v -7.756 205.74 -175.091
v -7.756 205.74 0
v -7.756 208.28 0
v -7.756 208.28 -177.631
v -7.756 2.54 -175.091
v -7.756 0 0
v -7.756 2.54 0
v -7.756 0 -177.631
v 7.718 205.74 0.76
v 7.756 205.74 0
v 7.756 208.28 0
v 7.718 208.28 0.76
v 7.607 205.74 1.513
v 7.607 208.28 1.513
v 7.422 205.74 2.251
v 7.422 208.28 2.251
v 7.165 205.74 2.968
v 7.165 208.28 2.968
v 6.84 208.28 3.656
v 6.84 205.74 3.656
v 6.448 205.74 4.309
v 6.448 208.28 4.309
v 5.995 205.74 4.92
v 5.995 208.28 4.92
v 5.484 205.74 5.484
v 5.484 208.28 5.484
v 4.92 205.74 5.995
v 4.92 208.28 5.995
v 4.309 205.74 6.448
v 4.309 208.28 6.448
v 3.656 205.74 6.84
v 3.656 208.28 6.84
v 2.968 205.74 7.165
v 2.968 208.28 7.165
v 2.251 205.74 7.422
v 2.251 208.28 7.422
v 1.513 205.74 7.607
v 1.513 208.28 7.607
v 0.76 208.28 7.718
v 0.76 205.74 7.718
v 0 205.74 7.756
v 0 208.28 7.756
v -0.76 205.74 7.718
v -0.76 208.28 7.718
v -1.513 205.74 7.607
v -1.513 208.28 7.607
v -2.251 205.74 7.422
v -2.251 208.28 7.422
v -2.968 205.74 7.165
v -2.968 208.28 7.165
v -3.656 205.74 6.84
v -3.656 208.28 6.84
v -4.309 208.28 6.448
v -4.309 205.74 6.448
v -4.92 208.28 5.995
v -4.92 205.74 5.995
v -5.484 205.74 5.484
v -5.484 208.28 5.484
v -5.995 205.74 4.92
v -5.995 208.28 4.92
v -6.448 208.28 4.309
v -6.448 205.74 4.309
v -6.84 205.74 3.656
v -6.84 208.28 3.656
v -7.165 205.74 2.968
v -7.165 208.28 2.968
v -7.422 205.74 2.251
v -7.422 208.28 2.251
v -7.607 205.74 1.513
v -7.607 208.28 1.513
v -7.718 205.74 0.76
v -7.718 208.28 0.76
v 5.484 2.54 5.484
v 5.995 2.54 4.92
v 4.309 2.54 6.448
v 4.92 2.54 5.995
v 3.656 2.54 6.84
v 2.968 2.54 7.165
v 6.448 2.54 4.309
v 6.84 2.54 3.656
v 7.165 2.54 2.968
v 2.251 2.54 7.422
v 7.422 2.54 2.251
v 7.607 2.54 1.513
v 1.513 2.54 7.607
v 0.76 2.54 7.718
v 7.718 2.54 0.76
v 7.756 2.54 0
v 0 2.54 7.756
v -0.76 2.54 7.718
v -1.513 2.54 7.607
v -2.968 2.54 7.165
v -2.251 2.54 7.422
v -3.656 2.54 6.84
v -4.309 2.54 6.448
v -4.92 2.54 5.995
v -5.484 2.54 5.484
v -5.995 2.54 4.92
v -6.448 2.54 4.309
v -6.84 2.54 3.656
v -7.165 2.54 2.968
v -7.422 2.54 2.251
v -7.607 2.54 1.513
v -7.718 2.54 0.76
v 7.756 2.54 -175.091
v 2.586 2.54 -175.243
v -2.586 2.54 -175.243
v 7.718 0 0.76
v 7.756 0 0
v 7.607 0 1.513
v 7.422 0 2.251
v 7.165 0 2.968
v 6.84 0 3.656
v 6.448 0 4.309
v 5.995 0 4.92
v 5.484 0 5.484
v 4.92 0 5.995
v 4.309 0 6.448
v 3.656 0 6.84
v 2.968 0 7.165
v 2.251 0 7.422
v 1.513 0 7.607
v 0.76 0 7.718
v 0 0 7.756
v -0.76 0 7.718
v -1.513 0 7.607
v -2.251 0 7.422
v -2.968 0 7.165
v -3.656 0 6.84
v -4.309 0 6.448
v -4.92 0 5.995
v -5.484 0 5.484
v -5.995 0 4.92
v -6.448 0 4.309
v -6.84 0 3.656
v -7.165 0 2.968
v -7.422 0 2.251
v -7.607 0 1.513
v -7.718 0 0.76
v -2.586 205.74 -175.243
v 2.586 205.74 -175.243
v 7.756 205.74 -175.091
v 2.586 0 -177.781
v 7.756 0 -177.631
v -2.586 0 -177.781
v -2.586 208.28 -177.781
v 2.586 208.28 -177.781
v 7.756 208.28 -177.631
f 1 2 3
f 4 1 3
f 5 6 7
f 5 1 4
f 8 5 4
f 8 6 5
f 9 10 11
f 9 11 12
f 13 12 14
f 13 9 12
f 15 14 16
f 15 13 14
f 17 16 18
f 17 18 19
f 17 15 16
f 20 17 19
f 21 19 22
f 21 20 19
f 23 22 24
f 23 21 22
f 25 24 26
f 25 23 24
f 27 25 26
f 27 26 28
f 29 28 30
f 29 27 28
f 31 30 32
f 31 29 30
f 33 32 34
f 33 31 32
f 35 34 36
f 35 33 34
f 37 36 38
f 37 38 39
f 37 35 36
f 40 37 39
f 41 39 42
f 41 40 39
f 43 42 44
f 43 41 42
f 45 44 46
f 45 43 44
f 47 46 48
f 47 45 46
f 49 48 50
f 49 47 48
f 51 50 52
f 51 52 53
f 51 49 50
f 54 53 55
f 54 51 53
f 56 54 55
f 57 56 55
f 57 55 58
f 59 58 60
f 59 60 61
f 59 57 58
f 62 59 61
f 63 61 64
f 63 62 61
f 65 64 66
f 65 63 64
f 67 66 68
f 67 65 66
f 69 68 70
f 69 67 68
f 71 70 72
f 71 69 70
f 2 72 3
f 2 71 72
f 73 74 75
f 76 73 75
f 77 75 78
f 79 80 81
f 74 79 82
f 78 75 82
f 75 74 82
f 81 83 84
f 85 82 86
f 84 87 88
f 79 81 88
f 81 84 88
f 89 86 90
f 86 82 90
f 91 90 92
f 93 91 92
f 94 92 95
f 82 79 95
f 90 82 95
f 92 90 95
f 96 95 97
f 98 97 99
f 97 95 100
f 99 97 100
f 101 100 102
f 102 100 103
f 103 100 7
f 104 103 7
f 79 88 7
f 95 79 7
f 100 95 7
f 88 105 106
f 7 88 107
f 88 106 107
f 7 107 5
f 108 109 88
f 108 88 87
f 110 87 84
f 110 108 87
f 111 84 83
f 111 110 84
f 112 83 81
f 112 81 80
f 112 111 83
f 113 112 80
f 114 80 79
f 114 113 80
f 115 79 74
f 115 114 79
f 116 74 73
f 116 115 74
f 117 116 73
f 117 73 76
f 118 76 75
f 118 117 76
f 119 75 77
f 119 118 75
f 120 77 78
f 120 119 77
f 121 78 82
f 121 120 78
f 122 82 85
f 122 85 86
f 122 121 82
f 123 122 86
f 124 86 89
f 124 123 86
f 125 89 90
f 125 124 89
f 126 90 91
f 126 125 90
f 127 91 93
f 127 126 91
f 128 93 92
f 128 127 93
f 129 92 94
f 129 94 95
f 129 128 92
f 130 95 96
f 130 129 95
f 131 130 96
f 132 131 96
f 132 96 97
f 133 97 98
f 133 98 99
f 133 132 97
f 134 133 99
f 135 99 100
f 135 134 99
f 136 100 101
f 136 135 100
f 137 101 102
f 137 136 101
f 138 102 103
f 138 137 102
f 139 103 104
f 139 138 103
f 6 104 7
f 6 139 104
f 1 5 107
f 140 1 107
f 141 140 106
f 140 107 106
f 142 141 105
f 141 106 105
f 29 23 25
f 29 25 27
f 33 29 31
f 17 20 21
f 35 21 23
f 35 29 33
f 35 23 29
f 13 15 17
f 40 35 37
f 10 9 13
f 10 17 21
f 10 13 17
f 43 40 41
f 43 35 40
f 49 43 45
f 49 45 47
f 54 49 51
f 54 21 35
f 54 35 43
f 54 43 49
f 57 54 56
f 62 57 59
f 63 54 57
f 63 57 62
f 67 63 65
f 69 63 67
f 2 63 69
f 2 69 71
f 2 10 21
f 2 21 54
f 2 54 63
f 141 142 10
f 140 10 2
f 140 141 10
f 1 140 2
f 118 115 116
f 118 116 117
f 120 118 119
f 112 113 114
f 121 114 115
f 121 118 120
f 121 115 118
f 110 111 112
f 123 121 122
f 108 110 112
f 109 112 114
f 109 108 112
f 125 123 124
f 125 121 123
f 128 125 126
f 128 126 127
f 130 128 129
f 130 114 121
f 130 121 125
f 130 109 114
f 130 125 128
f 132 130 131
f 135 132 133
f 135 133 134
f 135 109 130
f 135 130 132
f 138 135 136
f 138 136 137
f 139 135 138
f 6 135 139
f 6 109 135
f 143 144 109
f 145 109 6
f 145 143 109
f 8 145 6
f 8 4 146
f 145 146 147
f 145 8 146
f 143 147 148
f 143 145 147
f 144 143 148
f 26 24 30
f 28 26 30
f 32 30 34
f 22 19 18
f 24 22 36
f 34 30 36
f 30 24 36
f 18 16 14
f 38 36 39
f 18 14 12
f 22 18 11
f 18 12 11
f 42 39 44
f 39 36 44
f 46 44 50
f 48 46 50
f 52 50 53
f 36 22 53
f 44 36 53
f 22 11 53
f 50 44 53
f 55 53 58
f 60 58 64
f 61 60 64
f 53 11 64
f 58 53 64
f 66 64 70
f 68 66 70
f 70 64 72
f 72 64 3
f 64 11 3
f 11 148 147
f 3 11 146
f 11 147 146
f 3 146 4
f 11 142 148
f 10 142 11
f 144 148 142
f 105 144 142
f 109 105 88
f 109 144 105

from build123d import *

# Parameters (mm, degrees)
BOSS_EXTRUDE1_DEPTH = 2.54
BOSS_EXTRUDE2_DEPTH = 203.2
BOSS_EXTRUDE3_DEPTH = 2.54


with BuildPart() as part:
    # Sketch1 → Boss-Extrude1 (new body)
    with BuildSketch(Plane(origin=(0, 0, 0), x_dir=(1, 0, 0), z_dir=(0, 1, 0))):
        with BuildLine():
            Line((-7.755527074, 0), (-7.755527074, 177.630773797))
            ThreePointArc((-7.755527074, 177.630773797), (0, 177.8), (7.755527074, 177.630773797))
            Line((7.755527074, 177.630773797), (7.755527074, 0))
            ThreePointArc((7.755527074, 0), (0, -7.755527074), (-7.755527074, 0))
        make_face()
    extrude(amount=BOSS_EXTRUDE1_DEPTH)

    # Sketch2 → Boss-Extrude2 (add)
    with BuildSketch(Plane(origin=(0, 2.54, 0), x_dir=(1, 0, 0), z_dir=(0, 1, 0))):
        with BuildLine():
            Line((-7.755527074, 177.630773797), (-7.755527074, 175.090773797))
            ThreePointArc((-7.755527074, 175.090773797), (0, 175.262452537), (7.755527074, 175.090773797))
            Line((7.755527074, 175.090773797), (7.755527074, 177.630773797))
            ThreePointArc((7.755527074, 177.630773797), (0, 177.8), (-7.755527074, 177.630773797))
        make_face()
    extrude(amount=BOSS_EXTRUDE2_DEPTH)

    # Sketch3 → Boss-Extrude3 (add)
    with BuildSketch(Plane(origin=(0, 205.74, 0), x_dir=(1, 0, 0), z_dir=(0, 1, 0))):
        with BuildLine():
            Line((-7.755527074, 0), (-7.755527074, 177.630773797))
            ThreePointArc((-7.755527074, 177.630773797), (0, 177.8), (7.755527074, 177.630773797))
            Line((7.755527074, 177.630773797), (7.755527074, 0))
            ThreePointArc((7.755527074, 0), (0, -7.755527074), (-7.755527074, 0))
        make_face()
    extrude(amount=BOSS_EXTRUDE3_DEPTH)


solid = part.part
